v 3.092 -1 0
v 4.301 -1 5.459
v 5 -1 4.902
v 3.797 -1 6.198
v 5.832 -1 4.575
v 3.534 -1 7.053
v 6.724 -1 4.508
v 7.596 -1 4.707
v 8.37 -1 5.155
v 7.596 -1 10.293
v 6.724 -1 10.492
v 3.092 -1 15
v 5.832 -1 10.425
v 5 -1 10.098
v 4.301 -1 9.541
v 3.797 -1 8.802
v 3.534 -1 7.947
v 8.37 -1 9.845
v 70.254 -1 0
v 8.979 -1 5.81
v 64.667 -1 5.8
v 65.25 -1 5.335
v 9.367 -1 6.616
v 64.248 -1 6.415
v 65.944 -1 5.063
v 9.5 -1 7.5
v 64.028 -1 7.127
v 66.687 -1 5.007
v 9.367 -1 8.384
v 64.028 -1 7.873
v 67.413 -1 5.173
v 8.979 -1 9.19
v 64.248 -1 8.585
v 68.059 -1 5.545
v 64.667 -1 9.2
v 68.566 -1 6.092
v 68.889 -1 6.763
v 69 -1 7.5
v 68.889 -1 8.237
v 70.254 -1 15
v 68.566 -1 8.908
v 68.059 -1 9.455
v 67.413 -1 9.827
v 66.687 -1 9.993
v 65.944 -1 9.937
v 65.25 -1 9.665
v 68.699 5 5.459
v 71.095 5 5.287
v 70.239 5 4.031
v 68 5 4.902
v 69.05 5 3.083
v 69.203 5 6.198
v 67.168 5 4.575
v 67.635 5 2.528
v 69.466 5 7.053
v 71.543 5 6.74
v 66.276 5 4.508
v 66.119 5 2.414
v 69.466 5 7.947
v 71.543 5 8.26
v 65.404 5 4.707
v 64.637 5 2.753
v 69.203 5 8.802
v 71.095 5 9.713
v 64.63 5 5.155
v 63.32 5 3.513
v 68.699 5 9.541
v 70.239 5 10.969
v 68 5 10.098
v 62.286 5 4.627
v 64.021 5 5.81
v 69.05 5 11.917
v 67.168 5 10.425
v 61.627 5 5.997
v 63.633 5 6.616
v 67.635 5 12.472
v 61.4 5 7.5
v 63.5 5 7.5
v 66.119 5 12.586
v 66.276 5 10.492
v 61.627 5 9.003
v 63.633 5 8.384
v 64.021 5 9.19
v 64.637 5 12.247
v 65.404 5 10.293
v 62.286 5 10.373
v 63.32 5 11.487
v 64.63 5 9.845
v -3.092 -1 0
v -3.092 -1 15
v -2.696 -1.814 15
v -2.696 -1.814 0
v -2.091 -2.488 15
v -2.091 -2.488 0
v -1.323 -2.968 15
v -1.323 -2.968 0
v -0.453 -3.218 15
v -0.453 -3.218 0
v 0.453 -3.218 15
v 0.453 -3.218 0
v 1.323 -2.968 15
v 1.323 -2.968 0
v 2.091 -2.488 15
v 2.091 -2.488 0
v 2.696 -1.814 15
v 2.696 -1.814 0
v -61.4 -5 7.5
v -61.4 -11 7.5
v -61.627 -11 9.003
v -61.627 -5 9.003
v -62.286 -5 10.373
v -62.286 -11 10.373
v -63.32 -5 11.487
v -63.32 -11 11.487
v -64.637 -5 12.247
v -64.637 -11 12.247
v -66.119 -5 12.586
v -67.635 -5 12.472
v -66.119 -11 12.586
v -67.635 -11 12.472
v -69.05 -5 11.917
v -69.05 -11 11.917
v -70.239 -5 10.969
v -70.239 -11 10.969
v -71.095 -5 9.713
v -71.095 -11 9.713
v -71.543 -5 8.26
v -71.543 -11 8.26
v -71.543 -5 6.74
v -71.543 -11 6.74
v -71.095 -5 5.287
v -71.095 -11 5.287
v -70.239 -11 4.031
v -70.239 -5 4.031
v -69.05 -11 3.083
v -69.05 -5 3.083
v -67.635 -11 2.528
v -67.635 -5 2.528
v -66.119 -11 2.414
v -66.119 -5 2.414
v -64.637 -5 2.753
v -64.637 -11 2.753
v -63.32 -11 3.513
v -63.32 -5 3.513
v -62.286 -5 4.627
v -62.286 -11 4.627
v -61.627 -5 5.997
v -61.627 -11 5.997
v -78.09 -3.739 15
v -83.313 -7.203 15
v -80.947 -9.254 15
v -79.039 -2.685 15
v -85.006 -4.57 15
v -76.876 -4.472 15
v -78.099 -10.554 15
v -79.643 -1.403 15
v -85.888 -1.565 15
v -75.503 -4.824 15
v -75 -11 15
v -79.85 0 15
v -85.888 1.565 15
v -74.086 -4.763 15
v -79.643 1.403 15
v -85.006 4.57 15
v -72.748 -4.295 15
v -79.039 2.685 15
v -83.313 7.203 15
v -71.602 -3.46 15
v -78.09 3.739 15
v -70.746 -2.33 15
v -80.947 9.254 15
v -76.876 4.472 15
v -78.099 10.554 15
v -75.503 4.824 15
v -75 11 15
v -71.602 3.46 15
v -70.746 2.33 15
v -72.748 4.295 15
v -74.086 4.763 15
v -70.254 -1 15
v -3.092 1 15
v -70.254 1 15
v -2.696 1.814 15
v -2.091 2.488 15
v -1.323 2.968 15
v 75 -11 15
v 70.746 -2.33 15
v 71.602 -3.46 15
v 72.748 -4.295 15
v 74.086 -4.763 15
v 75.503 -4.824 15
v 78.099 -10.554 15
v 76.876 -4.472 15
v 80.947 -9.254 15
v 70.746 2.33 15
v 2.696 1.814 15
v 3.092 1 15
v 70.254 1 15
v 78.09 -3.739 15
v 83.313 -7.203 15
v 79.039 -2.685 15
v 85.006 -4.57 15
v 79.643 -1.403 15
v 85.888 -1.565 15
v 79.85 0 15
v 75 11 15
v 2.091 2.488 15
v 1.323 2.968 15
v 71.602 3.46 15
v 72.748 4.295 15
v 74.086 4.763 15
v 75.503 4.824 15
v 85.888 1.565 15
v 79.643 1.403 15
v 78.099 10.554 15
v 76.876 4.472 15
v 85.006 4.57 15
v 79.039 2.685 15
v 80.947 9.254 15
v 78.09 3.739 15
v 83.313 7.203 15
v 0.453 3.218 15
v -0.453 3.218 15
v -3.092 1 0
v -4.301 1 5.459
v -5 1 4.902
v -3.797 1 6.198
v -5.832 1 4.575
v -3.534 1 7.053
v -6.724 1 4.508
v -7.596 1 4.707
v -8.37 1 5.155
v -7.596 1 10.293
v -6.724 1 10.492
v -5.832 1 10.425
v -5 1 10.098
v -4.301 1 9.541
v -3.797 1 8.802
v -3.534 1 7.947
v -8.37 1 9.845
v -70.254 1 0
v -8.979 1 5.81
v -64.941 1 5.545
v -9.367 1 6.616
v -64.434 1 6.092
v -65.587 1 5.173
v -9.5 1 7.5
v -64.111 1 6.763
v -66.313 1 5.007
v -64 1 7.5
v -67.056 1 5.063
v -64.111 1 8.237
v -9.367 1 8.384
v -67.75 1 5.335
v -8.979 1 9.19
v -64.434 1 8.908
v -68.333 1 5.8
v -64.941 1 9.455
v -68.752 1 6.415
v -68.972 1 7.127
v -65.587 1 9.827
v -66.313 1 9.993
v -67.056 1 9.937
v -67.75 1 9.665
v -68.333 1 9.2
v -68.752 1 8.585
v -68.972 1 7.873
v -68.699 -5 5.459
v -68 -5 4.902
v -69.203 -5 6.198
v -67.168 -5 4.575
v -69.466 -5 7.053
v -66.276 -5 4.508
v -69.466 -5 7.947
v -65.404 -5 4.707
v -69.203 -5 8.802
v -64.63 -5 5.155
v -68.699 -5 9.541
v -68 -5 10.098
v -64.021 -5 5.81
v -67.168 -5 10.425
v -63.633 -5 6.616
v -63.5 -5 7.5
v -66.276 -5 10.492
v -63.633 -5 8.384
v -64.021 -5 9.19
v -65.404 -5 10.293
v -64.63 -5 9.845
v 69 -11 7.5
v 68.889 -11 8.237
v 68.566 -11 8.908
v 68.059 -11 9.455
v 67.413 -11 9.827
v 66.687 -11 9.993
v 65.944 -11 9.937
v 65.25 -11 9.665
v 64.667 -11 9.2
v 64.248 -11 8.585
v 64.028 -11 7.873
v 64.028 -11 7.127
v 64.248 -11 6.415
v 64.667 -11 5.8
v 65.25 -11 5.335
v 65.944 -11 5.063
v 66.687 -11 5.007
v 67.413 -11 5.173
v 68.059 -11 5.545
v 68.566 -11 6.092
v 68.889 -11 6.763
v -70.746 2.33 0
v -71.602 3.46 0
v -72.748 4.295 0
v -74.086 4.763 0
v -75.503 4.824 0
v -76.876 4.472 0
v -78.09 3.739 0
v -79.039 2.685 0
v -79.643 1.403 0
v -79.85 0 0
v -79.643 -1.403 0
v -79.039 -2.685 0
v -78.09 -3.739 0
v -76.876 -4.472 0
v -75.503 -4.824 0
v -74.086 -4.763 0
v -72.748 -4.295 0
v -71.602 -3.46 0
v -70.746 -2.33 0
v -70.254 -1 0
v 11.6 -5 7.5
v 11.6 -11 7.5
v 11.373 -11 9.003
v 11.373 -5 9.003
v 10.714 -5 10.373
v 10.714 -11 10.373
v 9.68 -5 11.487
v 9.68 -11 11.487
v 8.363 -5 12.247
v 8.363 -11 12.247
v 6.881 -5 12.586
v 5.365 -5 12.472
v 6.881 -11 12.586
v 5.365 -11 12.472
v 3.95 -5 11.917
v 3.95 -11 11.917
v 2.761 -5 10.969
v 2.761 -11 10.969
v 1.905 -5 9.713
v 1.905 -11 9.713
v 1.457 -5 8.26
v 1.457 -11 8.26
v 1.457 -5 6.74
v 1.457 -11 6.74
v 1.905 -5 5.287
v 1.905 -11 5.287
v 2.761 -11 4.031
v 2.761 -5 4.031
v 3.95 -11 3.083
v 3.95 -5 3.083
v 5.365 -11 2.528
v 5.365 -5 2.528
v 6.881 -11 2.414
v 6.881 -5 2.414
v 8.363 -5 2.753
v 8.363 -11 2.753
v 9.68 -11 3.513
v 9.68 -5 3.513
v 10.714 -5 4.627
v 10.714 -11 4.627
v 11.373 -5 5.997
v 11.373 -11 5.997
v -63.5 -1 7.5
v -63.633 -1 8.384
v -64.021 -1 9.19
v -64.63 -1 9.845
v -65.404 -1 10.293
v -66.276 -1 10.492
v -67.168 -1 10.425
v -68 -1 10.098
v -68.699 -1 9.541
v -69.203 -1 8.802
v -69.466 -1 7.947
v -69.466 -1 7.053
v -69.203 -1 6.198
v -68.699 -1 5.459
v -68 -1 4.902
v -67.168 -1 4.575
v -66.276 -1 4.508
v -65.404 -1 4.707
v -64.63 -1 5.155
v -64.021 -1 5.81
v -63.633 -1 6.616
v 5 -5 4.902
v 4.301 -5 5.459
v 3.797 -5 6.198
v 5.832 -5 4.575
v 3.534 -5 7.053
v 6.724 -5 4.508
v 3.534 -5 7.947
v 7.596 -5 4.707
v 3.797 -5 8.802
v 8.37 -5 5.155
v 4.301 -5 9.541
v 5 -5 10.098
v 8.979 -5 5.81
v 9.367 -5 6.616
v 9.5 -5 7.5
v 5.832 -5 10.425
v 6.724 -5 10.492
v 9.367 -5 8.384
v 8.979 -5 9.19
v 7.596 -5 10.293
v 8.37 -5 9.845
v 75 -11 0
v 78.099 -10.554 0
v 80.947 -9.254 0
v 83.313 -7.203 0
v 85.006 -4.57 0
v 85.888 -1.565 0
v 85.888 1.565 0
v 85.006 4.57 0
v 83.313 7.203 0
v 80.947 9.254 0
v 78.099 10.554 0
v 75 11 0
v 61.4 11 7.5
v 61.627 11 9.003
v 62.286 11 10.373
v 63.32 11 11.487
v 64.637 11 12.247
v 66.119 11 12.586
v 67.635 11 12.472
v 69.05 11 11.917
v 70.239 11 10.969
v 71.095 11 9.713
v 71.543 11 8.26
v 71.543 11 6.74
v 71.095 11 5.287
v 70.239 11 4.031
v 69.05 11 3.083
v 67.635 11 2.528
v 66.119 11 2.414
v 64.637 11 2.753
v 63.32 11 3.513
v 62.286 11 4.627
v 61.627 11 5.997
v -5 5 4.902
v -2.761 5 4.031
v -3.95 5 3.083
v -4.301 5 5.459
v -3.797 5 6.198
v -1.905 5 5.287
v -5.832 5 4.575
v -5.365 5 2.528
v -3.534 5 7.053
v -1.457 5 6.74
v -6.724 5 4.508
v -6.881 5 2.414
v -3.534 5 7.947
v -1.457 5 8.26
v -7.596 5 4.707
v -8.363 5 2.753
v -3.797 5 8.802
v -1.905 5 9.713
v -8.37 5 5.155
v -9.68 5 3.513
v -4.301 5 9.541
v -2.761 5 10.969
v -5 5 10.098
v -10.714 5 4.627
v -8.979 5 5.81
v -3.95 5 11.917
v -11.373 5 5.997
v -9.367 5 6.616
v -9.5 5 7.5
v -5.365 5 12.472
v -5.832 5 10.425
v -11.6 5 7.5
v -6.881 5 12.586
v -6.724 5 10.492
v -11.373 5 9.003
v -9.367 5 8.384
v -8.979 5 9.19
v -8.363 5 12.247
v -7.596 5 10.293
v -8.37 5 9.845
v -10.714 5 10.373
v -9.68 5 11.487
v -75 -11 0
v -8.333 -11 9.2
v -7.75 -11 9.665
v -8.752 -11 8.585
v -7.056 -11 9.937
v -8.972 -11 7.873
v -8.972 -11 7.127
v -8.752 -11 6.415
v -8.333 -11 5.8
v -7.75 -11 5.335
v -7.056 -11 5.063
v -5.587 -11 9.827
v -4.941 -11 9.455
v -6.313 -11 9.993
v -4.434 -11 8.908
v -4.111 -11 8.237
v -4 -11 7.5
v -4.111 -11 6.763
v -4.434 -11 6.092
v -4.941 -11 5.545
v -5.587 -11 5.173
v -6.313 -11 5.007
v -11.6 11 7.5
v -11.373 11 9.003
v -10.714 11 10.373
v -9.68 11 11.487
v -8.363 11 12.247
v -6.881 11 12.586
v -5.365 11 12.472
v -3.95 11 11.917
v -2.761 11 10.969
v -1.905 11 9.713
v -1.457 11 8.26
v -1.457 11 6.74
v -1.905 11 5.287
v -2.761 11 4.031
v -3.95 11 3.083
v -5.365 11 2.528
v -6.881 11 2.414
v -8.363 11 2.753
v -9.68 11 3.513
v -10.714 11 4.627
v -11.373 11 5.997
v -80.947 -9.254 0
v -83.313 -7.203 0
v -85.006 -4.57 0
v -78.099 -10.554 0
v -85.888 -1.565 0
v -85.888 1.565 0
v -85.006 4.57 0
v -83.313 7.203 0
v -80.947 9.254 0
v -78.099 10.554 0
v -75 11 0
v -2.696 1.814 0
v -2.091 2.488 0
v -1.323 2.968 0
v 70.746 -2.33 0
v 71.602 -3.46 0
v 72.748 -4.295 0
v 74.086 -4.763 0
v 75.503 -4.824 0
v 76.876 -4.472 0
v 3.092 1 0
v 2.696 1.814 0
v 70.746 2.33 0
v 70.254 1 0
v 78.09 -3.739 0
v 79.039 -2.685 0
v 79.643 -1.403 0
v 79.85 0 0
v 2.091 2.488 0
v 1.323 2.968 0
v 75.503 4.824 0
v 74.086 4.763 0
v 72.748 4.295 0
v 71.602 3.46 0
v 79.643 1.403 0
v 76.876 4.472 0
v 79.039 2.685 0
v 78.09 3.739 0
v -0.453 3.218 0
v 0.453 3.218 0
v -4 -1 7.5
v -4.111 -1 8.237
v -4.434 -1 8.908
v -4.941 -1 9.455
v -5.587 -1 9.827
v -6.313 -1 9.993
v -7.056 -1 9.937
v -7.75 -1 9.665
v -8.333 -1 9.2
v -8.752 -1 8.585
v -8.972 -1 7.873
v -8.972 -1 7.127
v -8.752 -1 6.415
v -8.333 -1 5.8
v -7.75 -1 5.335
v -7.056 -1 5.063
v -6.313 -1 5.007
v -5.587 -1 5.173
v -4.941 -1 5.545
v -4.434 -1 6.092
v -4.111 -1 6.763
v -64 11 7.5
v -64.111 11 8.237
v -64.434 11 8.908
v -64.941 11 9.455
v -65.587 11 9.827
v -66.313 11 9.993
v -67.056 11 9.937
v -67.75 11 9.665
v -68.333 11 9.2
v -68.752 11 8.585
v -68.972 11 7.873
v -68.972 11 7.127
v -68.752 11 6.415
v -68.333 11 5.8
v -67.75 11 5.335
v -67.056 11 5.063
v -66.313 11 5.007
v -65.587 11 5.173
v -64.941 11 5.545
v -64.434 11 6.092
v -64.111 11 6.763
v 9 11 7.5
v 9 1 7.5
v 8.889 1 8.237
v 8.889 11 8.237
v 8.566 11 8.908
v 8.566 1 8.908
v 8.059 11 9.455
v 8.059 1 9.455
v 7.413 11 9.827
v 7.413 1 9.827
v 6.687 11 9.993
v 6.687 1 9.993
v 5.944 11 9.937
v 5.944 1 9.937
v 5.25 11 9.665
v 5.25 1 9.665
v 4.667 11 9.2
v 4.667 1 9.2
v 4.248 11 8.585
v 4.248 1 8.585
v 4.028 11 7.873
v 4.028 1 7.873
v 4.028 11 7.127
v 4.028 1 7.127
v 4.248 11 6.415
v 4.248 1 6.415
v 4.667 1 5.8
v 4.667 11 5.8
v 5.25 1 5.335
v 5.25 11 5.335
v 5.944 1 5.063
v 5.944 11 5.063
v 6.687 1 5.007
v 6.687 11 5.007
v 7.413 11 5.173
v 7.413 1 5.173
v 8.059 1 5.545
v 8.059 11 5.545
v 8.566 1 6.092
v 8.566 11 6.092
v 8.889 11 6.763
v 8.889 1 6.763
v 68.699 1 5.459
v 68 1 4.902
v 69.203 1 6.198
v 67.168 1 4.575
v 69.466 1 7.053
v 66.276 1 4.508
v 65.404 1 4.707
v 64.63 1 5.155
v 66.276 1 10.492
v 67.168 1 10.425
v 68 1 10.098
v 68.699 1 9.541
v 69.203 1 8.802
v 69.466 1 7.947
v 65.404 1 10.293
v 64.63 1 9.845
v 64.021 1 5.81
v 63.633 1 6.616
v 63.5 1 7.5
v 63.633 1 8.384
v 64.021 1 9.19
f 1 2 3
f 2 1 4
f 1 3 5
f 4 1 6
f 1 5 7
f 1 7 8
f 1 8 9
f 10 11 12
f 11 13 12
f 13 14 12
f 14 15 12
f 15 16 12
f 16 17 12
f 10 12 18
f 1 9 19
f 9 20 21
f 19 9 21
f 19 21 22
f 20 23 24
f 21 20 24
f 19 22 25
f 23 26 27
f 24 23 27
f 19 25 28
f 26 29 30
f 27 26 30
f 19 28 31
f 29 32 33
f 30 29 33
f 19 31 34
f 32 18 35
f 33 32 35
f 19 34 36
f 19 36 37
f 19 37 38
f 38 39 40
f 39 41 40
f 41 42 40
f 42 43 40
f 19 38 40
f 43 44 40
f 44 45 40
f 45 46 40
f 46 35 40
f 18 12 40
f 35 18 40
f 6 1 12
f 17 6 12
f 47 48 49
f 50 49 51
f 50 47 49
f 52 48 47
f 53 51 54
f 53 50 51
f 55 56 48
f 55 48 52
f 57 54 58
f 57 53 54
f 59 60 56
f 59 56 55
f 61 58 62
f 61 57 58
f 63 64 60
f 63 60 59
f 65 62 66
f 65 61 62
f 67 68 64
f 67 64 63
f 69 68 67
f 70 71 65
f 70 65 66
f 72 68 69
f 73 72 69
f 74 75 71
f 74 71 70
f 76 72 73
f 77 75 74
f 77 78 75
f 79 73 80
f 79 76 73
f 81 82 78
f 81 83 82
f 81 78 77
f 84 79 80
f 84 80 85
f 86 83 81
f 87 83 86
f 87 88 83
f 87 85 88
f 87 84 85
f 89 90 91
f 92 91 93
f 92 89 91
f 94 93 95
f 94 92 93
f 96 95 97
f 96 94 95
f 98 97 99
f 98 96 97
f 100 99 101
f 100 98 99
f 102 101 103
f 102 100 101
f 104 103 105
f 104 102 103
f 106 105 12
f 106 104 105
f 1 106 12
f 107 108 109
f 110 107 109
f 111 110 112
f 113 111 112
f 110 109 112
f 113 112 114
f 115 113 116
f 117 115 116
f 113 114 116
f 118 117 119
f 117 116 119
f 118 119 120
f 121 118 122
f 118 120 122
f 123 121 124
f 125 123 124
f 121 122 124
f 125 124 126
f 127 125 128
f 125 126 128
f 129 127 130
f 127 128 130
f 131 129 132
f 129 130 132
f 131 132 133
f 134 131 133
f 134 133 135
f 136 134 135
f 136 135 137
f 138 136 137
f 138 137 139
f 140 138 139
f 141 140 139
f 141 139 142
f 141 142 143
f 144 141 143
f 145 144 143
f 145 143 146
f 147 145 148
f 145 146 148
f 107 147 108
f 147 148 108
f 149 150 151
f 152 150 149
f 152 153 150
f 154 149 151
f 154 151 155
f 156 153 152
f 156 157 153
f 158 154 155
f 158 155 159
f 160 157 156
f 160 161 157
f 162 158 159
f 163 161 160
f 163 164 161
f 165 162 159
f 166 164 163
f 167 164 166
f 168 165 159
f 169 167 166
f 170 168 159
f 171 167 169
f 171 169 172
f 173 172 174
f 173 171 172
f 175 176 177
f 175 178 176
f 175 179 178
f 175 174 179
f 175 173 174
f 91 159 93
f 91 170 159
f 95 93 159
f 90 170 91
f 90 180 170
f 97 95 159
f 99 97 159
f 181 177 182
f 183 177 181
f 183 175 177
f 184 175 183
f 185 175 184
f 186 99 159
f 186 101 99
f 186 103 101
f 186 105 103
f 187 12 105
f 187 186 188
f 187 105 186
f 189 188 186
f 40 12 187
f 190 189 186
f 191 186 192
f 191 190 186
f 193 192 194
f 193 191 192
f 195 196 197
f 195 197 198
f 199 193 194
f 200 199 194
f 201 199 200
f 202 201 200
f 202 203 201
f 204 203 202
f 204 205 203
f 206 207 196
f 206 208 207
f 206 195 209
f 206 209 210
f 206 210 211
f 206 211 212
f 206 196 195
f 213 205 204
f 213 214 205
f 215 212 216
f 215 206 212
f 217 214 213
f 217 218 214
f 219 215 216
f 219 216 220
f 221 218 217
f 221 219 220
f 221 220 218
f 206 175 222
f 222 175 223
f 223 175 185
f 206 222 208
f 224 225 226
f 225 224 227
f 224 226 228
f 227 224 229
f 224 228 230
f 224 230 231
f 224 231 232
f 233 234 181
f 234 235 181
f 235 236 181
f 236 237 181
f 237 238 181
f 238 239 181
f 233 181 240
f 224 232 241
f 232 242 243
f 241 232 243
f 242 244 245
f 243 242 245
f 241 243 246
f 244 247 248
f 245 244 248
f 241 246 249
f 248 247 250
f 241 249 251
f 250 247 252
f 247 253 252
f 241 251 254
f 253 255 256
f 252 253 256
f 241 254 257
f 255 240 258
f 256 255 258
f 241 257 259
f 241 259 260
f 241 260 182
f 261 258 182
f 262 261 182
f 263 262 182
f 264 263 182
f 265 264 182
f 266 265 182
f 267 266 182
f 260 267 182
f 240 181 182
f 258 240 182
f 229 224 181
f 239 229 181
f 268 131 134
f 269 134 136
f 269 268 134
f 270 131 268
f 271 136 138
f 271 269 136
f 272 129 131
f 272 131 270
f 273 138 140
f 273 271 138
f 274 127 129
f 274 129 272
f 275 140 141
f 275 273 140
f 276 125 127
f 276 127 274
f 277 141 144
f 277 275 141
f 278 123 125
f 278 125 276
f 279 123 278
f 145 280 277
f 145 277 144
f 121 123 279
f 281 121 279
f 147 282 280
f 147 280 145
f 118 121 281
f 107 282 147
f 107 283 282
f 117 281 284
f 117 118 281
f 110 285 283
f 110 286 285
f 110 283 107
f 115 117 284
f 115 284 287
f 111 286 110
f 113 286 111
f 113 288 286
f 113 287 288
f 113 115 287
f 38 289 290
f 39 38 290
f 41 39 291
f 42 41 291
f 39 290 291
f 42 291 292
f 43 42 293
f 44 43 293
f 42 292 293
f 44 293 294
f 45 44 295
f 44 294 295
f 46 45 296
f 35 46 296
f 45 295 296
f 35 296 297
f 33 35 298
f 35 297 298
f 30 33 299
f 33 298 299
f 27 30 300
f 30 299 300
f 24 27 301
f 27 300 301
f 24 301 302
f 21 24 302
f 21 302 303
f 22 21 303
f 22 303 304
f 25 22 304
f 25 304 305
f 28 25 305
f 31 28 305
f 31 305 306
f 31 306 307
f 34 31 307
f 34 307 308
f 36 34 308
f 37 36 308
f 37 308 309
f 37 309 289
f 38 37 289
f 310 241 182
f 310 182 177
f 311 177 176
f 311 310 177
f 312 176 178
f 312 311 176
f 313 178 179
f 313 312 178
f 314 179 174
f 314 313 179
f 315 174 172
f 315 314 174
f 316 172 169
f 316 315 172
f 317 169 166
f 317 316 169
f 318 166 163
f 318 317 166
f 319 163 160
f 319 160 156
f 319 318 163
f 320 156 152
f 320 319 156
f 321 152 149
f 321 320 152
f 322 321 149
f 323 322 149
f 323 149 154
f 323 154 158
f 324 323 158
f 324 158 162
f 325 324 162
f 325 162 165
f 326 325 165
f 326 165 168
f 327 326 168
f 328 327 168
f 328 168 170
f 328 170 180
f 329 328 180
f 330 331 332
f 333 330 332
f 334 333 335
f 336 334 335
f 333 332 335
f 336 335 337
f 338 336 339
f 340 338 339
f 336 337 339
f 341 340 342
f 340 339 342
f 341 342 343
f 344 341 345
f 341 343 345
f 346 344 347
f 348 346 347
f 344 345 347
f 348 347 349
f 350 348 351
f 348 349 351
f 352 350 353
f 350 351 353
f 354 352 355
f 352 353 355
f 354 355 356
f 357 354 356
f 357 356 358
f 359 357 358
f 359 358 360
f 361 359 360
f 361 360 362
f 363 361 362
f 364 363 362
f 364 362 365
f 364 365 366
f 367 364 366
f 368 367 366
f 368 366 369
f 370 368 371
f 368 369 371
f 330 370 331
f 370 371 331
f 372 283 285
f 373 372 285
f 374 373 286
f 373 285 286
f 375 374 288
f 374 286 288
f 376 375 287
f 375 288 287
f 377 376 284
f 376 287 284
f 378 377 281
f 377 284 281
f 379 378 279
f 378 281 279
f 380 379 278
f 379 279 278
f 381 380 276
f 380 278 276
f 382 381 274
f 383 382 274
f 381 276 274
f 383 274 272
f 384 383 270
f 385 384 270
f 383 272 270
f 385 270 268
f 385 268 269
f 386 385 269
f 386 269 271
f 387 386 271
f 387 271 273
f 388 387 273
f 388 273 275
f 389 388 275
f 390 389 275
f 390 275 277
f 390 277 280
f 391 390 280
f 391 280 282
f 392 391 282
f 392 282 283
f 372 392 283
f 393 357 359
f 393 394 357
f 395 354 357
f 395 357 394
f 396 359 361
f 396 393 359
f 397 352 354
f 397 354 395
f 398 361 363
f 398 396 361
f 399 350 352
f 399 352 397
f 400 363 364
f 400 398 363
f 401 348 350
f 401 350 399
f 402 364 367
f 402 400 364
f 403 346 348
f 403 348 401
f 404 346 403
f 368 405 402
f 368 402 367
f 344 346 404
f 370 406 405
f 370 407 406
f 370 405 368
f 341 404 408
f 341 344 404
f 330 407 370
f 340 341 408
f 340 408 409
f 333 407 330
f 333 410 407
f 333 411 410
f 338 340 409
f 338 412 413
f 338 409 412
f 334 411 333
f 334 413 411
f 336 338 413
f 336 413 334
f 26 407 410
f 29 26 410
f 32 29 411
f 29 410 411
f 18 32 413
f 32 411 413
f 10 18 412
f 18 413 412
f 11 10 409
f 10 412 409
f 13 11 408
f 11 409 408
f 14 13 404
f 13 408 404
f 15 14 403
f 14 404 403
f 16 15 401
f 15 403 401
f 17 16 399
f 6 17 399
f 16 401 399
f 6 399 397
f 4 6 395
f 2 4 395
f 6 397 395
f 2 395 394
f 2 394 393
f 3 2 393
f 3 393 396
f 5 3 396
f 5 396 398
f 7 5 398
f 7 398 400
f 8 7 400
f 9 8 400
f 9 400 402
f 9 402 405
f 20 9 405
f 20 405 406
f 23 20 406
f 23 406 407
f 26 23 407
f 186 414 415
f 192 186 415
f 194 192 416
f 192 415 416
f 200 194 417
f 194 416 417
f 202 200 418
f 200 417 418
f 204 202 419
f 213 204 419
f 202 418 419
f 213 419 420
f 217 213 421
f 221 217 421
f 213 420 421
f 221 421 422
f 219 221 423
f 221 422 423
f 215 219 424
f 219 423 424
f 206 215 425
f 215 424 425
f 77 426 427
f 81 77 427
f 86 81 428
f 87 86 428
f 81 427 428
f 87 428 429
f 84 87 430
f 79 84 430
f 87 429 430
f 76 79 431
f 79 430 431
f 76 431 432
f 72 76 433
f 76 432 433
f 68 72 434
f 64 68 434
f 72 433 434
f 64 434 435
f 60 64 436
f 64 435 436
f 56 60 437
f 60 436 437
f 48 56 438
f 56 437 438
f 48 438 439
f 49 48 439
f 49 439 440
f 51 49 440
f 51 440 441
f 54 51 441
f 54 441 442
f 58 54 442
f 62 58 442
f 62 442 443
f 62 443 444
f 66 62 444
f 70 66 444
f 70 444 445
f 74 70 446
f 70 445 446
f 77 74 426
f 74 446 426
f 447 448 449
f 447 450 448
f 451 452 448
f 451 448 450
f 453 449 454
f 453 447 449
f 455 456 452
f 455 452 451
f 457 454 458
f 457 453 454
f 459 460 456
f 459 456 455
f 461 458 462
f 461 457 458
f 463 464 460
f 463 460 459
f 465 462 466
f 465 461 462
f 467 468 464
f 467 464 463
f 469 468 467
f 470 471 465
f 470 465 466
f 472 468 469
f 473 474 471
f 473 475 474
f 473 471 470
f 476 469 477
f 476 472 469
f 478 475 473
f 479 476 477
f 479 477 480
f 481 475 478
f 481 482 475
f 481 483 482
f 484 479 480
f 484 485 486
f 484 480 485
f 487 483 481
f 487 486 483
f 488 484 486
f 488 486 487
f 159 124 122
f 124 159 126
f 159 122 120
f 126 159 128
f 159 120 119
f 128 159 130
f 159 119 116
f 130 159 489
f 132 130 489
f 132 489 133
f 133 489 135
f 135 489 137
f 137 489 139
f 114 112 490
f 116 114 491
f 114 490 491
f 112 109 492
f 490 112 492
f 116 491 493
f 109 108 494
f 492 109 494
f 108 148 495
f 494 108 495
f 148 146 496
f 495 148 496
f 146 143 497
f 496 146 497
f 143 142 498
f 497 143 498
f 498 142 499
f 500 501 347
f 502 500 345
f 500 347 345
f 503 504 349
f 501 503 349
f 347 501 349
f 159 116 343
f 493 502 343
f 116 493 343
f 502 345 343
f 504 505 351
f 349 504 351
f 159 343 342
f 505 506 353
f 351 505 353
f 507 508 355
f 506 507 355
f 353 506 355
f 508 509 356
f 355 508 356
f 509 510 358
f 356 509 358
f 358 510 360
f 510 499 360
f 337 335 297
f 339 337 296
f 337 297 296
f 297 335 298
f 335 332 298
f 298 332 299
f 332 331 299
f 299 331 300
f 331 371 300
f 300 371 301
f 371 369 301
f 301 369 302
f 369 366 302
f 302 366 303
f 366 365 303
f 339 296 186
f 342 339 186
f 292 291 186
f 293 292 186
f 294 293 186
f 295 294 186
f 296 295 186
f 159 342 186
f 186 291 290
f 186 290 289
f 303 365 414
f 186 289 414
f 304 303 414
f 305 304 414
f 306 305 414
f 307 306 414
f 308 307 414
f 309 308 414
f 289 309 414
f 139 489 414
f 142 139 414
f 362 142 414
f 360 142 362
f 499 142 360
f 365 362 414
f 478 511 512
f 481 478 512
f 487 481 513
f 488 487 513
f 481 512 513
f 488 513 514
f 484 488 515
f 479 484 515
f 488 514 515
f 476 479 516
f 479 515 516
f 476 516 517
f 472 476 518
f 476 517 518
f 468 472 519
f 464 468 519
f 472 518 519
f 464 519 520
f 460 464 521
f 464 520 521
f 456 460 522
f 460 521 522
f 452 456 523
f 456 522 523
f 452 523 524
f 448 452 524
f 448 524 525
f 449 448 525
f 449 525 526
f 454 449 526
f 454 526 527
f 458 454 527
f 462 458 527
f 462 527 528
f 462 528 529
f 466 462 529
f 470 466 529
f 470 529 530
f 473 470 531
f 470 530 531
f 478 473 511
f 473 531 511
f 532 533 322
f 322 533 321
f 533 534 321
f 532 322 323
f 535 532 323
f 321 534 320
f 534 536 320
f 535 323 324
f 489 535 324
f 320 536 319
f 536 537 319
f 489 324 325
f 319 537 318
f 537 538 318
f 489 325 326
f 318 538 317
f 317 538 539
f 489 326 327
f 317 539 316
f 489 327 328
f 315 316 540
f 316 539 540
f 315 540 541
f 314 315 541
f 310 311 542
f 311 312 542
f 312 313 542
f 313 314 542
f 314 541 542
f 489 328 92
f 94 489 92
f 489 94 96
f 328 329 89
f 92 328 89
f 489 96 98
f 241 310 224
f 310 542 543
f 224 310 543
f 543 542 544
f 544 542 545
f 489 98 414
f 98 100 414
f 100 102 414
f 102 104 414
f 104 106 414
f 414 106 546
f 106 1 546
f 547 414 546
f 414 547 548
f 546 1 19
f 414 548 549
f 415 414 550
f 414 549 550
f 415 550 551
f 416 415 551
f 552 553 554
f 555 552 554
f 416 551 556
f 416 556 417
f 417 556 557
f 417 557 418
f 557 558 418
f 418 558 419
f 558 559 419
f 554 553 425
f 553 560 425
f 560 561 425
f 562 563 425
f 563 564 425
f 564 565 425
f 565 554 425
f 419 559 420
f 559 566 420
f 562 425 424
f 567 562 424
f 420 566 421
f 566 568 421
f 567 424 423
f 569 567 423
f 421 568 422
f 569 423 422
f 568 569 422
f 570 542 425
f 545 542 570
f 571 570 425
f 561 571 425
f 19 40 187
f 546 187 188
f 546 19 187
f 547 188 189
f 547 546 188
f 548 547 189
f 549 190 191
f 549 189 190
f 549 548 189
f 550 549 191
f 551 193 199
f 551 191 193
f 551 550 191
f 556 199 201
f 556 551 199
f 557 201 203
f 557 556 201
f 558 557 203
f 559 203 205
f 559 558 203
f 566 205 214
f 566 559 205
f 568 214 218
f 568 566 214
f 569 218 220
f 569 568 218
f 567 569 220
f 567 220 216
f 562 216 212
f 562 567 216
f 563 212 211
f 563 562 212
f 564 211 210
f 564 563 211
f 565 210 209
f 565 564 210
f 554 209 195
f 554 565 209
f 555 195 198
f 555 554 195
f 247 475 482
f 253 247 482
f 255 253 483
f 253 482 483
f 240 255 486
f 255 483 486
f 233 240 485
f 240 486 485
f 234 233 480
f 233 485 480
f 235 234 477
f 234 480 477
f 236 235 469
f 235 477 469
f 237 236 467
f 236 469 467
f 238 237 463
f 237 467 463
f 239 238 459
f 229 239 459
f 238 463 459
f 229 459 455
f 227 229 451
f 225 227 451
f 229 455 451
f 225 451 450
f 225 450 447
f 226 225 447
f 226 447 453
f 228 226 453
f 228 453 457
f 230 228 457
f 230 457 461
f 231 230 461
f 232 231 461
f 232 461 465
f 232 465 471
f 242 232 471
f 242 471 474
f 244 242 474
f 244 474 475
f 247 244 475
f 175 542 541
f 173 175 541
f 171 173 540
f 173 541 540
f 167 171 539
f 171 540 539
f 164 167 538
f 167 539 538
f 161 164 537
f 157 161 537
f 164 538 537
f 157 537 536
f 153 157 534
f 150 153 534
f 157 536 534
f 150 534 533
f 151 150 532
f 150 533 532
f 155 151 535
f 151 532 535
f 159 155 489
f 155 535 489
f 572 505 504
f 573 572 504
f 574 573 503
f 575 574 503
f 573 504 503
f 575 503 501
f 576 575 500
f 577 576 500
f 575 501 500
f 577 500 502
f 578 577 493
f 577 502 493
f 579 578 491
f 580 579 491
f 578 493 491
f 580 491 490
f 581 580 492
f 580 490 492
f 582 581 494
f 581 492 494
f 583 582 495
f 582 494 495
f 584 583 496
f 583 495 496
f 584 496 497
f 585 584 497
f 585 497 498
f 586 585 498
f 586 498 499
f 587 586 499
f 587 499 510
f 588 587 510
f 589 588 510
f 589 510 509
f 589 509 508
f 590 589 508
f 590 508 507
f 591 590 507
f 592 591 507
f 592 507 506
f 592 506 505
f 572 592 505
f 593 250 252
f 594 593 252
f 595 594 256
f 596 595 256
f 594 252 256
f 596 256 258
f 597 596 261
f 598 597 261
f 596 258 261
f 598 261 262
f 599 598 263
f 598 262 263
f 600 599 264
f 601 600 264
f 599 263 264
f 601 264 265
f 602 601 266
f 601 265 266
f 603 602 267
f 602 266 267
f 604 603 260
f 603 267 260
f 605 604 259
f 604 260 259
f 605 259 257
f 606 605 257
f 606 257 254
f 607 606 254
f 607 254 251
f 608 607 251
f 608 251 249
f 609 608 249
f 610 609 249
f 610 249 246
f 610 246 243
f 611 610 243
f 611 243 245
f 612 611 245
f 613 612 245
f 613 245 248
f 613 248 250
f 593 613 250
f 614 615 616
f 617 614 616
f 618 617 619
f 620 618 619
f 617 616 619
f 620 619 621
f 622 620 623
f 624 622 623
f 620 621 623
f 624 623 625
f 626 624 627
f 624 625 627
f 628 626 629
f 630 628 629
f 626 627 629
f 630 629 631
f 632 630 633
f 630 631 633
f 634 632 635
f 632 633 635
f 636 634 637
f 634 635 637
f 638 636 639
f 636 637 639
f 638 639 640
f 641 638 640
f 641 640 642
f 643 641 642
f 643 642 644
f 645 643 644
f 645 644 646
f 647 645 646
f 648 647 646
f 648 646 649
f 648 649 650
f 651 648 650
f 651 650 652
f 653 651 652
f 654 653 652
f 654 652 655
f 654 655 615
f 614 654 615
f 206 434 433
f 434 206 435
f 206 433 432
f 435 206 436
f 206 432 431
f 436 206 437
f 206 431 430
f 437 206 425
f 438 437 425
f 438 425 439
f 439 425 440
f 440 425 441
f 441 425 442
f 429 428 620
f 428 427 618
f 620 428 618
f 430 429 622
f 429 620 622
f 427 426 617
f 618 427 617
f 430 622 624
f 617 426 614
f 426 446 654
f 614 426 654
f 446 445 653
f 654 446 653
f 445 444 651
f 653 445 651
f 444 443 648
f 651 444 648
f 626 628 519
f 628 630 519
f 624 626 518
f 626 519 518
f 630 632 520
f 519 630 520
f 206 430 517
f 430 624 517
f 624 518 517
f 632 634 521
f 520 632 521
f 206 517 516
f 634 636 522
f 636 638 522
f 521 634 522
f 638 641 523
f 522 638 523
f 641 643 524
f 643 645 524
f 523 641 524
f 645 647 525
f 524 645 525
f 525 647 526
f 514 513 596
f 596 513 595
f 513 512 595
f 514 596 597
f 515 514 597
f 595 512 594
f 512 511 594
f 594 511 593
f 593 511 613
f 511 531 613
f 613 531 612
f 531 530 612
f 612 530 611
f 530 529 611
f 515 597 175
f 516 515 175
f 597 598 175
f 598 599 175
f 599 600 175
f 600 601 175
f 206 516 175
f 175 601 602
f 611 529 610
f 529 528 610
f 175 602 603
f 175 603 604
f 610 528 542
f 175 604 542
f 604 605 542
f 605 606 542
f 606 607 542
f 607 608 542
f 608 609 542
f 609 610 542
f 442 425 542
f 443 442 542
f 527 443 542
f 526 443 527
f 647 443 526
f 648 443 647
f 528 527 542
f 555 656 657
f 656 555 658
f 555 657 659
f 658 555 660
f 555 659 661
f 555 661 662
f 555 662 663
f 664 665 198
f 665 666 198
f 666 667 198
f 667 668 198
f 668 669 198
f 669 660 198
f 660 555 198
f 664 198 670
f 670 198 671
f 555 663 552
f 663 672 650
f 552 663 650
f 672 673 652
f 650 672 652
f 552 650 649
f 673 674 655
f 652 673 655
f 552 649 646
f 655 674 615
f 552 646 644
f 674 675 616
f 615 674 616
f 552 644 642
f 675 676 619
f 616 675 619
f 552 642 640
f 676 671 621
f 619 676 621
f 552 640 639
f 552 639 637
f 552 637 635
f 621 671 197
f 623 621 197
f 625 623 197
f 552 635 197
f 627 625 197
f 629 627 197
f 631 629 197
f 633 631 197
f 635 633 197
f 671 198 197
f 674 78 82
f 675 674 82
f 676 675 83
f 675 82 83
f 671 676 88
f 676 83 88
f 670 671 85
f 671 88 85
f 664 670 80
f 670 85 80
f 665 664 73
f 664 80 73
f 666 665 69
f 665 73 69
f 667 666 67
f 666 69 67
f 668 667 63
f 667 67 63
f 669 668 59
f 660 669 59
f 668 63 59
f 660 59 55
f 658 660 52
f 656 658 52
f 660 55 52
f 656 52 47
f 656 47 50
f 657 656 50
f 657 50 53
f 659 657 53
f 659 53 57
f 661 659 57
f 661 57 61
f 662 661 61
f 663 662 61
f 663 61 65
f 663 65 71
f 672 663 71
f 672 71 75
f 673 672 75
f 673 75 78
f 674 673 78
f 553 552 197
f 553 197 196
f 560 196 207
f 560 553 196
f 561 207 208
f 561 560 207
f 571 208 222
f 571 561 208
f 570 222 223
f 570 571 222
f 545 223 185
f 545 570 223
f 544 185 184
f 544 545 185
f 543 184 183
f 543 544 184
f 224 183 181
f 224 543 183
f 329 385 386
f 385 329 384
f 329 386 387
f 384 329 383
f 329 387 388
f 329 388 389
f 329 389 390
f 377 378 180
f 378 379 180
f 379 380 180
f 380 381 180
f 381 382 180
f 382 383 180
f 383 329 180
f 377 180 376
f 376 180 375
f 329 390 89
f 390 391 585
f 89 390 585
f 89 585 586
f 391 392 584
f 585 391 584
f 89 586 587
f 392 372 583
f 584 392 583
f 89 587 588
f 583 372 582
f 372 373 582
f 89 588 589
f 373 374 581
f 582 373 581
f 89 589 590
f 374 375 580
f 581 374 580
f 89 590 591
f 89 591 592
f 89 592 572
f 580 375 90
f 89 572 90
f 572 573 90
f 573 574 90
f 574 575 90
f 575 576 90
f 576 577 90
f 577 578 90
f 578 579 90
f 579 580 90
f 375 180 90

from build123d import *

# Parameters (mm, degrees)
F0_R      = 4.85
F0_R_2    = 3.25
F1_DEPTH  = 15
F3_DEPTH  = 15.001
F4_R      = 2.5
F5_DEPTH  = 22.001
F6_R      = 3
F7_DEPTH  = 10
F8_R      = 3
F9_DEPTH  = 10
F10_R     = 5.1
F11_DEPTH = 6
F12_R     = 5.1
F13_DEPTH = 6


with BuildPart() as f1:
    # F0 (on Top) → F1 (new body)
    with BuildSketch(Plane.XY):
        with BuildLine():
            Line((-75, -11), (0, -11))
            Line((0, -11), (75, -11))
            ThreePointArc((75, -11), (86, 0), (75, 11))
            Line((75, 11), (0, 11))
            Line((0, 11), (-75, 11))
            ThreePointArc((-75, 11), (-86, 0), (-75, -11))
        make_face()
        with Locations((-75, 0)):
            Circle(F0_R, mode=Mode.SUBTRACT)
        Circle(F0_R_2, mode=Mode.SUBTRACT)
        with Locations((75, 0)):
            Circle(F0_R, mode=Mode.SUBTRACT)
    extrude(amount=F1_DEPTH)

    # F2 (on face) → F3 (cut, through all)
    with BuildSketch(Plane.XY.offset(15)):
        Polygon((75, -1), (75, 1), (0, 1), (-75, 1), (-75, -1), (0, -1), align=None)
    extrude(amount=-F3_DEPTH, mode=Mode.SUBTRACT)

    # F4 (on face) → F5 (cut, through all)
    with BuildSketch(Plane.XZ.offset(11)):
        with Locations((-66.5, 7.5)):
            Circle(F4_R)
        with Locations((66.5, 7.5)):
            Circle(F4_R)
        with Locations((-6.5, 7.5)):
            Circle(F4_R)
        with Locations((6.5, 7.5)):
            Circle(F4_R)
    extrude(amount=-F5_DEPTH, mode=Mode.SUBTRACT)

    # F6 (on face) → F7 (cut, through all)
    with BuildSketch(Plane.XZ.offset(11)):
        with Locations((-66.5, 7.5)):
            Circle(F6_R)
        with Locations((6.5, 7.5)):
            Circle(F6_R)
    extrude(amount=-F7_DEPTH, mode=Mode.SUBTRACT)

    # F8 (on face) → F9 (cut, through all)
    with BuildSketch(Plane(origin=(0, 11, 0), x_dir=(-1, 0, 0), z_dir=(0, 1, 0))):
        with Locations((-66.5, 7.5)):
            Circle(F8_R)
        with Locations((6.5, 7.5)):
            Circle(F8_R)
    extrude(amount=-F9_DEPTH, mode=Mode.SUBTRACT)

    # F10 (on face) → F11 (cut)
    with BuildSketch(Plane.XZ.offset(11)):
        with Locations((-66.5, 7.5)):
            Circle(F10_R)
        with Locations((6.5, 7.5)):
            Circle(F10_R)
    extrude(amount=-F11_DEPTH, mode=Mode.SUBTRACT)

    # F12 (on face) → F13 (cut)
    with BuildSketch(Plane(origin=(0, 11, 0), x_dir=(-1, 0, 0), z_dir=(0, 1, 0))):
        with Locations((-66.5, 7.5)):
            Circle(F12_R)
        with Locations((6.5, 7.5)):
            Circle(F12_R)
    extrude(amount=-F13_DEPTH, mode=Mode.SUBTRACT)


solid = f1.part
